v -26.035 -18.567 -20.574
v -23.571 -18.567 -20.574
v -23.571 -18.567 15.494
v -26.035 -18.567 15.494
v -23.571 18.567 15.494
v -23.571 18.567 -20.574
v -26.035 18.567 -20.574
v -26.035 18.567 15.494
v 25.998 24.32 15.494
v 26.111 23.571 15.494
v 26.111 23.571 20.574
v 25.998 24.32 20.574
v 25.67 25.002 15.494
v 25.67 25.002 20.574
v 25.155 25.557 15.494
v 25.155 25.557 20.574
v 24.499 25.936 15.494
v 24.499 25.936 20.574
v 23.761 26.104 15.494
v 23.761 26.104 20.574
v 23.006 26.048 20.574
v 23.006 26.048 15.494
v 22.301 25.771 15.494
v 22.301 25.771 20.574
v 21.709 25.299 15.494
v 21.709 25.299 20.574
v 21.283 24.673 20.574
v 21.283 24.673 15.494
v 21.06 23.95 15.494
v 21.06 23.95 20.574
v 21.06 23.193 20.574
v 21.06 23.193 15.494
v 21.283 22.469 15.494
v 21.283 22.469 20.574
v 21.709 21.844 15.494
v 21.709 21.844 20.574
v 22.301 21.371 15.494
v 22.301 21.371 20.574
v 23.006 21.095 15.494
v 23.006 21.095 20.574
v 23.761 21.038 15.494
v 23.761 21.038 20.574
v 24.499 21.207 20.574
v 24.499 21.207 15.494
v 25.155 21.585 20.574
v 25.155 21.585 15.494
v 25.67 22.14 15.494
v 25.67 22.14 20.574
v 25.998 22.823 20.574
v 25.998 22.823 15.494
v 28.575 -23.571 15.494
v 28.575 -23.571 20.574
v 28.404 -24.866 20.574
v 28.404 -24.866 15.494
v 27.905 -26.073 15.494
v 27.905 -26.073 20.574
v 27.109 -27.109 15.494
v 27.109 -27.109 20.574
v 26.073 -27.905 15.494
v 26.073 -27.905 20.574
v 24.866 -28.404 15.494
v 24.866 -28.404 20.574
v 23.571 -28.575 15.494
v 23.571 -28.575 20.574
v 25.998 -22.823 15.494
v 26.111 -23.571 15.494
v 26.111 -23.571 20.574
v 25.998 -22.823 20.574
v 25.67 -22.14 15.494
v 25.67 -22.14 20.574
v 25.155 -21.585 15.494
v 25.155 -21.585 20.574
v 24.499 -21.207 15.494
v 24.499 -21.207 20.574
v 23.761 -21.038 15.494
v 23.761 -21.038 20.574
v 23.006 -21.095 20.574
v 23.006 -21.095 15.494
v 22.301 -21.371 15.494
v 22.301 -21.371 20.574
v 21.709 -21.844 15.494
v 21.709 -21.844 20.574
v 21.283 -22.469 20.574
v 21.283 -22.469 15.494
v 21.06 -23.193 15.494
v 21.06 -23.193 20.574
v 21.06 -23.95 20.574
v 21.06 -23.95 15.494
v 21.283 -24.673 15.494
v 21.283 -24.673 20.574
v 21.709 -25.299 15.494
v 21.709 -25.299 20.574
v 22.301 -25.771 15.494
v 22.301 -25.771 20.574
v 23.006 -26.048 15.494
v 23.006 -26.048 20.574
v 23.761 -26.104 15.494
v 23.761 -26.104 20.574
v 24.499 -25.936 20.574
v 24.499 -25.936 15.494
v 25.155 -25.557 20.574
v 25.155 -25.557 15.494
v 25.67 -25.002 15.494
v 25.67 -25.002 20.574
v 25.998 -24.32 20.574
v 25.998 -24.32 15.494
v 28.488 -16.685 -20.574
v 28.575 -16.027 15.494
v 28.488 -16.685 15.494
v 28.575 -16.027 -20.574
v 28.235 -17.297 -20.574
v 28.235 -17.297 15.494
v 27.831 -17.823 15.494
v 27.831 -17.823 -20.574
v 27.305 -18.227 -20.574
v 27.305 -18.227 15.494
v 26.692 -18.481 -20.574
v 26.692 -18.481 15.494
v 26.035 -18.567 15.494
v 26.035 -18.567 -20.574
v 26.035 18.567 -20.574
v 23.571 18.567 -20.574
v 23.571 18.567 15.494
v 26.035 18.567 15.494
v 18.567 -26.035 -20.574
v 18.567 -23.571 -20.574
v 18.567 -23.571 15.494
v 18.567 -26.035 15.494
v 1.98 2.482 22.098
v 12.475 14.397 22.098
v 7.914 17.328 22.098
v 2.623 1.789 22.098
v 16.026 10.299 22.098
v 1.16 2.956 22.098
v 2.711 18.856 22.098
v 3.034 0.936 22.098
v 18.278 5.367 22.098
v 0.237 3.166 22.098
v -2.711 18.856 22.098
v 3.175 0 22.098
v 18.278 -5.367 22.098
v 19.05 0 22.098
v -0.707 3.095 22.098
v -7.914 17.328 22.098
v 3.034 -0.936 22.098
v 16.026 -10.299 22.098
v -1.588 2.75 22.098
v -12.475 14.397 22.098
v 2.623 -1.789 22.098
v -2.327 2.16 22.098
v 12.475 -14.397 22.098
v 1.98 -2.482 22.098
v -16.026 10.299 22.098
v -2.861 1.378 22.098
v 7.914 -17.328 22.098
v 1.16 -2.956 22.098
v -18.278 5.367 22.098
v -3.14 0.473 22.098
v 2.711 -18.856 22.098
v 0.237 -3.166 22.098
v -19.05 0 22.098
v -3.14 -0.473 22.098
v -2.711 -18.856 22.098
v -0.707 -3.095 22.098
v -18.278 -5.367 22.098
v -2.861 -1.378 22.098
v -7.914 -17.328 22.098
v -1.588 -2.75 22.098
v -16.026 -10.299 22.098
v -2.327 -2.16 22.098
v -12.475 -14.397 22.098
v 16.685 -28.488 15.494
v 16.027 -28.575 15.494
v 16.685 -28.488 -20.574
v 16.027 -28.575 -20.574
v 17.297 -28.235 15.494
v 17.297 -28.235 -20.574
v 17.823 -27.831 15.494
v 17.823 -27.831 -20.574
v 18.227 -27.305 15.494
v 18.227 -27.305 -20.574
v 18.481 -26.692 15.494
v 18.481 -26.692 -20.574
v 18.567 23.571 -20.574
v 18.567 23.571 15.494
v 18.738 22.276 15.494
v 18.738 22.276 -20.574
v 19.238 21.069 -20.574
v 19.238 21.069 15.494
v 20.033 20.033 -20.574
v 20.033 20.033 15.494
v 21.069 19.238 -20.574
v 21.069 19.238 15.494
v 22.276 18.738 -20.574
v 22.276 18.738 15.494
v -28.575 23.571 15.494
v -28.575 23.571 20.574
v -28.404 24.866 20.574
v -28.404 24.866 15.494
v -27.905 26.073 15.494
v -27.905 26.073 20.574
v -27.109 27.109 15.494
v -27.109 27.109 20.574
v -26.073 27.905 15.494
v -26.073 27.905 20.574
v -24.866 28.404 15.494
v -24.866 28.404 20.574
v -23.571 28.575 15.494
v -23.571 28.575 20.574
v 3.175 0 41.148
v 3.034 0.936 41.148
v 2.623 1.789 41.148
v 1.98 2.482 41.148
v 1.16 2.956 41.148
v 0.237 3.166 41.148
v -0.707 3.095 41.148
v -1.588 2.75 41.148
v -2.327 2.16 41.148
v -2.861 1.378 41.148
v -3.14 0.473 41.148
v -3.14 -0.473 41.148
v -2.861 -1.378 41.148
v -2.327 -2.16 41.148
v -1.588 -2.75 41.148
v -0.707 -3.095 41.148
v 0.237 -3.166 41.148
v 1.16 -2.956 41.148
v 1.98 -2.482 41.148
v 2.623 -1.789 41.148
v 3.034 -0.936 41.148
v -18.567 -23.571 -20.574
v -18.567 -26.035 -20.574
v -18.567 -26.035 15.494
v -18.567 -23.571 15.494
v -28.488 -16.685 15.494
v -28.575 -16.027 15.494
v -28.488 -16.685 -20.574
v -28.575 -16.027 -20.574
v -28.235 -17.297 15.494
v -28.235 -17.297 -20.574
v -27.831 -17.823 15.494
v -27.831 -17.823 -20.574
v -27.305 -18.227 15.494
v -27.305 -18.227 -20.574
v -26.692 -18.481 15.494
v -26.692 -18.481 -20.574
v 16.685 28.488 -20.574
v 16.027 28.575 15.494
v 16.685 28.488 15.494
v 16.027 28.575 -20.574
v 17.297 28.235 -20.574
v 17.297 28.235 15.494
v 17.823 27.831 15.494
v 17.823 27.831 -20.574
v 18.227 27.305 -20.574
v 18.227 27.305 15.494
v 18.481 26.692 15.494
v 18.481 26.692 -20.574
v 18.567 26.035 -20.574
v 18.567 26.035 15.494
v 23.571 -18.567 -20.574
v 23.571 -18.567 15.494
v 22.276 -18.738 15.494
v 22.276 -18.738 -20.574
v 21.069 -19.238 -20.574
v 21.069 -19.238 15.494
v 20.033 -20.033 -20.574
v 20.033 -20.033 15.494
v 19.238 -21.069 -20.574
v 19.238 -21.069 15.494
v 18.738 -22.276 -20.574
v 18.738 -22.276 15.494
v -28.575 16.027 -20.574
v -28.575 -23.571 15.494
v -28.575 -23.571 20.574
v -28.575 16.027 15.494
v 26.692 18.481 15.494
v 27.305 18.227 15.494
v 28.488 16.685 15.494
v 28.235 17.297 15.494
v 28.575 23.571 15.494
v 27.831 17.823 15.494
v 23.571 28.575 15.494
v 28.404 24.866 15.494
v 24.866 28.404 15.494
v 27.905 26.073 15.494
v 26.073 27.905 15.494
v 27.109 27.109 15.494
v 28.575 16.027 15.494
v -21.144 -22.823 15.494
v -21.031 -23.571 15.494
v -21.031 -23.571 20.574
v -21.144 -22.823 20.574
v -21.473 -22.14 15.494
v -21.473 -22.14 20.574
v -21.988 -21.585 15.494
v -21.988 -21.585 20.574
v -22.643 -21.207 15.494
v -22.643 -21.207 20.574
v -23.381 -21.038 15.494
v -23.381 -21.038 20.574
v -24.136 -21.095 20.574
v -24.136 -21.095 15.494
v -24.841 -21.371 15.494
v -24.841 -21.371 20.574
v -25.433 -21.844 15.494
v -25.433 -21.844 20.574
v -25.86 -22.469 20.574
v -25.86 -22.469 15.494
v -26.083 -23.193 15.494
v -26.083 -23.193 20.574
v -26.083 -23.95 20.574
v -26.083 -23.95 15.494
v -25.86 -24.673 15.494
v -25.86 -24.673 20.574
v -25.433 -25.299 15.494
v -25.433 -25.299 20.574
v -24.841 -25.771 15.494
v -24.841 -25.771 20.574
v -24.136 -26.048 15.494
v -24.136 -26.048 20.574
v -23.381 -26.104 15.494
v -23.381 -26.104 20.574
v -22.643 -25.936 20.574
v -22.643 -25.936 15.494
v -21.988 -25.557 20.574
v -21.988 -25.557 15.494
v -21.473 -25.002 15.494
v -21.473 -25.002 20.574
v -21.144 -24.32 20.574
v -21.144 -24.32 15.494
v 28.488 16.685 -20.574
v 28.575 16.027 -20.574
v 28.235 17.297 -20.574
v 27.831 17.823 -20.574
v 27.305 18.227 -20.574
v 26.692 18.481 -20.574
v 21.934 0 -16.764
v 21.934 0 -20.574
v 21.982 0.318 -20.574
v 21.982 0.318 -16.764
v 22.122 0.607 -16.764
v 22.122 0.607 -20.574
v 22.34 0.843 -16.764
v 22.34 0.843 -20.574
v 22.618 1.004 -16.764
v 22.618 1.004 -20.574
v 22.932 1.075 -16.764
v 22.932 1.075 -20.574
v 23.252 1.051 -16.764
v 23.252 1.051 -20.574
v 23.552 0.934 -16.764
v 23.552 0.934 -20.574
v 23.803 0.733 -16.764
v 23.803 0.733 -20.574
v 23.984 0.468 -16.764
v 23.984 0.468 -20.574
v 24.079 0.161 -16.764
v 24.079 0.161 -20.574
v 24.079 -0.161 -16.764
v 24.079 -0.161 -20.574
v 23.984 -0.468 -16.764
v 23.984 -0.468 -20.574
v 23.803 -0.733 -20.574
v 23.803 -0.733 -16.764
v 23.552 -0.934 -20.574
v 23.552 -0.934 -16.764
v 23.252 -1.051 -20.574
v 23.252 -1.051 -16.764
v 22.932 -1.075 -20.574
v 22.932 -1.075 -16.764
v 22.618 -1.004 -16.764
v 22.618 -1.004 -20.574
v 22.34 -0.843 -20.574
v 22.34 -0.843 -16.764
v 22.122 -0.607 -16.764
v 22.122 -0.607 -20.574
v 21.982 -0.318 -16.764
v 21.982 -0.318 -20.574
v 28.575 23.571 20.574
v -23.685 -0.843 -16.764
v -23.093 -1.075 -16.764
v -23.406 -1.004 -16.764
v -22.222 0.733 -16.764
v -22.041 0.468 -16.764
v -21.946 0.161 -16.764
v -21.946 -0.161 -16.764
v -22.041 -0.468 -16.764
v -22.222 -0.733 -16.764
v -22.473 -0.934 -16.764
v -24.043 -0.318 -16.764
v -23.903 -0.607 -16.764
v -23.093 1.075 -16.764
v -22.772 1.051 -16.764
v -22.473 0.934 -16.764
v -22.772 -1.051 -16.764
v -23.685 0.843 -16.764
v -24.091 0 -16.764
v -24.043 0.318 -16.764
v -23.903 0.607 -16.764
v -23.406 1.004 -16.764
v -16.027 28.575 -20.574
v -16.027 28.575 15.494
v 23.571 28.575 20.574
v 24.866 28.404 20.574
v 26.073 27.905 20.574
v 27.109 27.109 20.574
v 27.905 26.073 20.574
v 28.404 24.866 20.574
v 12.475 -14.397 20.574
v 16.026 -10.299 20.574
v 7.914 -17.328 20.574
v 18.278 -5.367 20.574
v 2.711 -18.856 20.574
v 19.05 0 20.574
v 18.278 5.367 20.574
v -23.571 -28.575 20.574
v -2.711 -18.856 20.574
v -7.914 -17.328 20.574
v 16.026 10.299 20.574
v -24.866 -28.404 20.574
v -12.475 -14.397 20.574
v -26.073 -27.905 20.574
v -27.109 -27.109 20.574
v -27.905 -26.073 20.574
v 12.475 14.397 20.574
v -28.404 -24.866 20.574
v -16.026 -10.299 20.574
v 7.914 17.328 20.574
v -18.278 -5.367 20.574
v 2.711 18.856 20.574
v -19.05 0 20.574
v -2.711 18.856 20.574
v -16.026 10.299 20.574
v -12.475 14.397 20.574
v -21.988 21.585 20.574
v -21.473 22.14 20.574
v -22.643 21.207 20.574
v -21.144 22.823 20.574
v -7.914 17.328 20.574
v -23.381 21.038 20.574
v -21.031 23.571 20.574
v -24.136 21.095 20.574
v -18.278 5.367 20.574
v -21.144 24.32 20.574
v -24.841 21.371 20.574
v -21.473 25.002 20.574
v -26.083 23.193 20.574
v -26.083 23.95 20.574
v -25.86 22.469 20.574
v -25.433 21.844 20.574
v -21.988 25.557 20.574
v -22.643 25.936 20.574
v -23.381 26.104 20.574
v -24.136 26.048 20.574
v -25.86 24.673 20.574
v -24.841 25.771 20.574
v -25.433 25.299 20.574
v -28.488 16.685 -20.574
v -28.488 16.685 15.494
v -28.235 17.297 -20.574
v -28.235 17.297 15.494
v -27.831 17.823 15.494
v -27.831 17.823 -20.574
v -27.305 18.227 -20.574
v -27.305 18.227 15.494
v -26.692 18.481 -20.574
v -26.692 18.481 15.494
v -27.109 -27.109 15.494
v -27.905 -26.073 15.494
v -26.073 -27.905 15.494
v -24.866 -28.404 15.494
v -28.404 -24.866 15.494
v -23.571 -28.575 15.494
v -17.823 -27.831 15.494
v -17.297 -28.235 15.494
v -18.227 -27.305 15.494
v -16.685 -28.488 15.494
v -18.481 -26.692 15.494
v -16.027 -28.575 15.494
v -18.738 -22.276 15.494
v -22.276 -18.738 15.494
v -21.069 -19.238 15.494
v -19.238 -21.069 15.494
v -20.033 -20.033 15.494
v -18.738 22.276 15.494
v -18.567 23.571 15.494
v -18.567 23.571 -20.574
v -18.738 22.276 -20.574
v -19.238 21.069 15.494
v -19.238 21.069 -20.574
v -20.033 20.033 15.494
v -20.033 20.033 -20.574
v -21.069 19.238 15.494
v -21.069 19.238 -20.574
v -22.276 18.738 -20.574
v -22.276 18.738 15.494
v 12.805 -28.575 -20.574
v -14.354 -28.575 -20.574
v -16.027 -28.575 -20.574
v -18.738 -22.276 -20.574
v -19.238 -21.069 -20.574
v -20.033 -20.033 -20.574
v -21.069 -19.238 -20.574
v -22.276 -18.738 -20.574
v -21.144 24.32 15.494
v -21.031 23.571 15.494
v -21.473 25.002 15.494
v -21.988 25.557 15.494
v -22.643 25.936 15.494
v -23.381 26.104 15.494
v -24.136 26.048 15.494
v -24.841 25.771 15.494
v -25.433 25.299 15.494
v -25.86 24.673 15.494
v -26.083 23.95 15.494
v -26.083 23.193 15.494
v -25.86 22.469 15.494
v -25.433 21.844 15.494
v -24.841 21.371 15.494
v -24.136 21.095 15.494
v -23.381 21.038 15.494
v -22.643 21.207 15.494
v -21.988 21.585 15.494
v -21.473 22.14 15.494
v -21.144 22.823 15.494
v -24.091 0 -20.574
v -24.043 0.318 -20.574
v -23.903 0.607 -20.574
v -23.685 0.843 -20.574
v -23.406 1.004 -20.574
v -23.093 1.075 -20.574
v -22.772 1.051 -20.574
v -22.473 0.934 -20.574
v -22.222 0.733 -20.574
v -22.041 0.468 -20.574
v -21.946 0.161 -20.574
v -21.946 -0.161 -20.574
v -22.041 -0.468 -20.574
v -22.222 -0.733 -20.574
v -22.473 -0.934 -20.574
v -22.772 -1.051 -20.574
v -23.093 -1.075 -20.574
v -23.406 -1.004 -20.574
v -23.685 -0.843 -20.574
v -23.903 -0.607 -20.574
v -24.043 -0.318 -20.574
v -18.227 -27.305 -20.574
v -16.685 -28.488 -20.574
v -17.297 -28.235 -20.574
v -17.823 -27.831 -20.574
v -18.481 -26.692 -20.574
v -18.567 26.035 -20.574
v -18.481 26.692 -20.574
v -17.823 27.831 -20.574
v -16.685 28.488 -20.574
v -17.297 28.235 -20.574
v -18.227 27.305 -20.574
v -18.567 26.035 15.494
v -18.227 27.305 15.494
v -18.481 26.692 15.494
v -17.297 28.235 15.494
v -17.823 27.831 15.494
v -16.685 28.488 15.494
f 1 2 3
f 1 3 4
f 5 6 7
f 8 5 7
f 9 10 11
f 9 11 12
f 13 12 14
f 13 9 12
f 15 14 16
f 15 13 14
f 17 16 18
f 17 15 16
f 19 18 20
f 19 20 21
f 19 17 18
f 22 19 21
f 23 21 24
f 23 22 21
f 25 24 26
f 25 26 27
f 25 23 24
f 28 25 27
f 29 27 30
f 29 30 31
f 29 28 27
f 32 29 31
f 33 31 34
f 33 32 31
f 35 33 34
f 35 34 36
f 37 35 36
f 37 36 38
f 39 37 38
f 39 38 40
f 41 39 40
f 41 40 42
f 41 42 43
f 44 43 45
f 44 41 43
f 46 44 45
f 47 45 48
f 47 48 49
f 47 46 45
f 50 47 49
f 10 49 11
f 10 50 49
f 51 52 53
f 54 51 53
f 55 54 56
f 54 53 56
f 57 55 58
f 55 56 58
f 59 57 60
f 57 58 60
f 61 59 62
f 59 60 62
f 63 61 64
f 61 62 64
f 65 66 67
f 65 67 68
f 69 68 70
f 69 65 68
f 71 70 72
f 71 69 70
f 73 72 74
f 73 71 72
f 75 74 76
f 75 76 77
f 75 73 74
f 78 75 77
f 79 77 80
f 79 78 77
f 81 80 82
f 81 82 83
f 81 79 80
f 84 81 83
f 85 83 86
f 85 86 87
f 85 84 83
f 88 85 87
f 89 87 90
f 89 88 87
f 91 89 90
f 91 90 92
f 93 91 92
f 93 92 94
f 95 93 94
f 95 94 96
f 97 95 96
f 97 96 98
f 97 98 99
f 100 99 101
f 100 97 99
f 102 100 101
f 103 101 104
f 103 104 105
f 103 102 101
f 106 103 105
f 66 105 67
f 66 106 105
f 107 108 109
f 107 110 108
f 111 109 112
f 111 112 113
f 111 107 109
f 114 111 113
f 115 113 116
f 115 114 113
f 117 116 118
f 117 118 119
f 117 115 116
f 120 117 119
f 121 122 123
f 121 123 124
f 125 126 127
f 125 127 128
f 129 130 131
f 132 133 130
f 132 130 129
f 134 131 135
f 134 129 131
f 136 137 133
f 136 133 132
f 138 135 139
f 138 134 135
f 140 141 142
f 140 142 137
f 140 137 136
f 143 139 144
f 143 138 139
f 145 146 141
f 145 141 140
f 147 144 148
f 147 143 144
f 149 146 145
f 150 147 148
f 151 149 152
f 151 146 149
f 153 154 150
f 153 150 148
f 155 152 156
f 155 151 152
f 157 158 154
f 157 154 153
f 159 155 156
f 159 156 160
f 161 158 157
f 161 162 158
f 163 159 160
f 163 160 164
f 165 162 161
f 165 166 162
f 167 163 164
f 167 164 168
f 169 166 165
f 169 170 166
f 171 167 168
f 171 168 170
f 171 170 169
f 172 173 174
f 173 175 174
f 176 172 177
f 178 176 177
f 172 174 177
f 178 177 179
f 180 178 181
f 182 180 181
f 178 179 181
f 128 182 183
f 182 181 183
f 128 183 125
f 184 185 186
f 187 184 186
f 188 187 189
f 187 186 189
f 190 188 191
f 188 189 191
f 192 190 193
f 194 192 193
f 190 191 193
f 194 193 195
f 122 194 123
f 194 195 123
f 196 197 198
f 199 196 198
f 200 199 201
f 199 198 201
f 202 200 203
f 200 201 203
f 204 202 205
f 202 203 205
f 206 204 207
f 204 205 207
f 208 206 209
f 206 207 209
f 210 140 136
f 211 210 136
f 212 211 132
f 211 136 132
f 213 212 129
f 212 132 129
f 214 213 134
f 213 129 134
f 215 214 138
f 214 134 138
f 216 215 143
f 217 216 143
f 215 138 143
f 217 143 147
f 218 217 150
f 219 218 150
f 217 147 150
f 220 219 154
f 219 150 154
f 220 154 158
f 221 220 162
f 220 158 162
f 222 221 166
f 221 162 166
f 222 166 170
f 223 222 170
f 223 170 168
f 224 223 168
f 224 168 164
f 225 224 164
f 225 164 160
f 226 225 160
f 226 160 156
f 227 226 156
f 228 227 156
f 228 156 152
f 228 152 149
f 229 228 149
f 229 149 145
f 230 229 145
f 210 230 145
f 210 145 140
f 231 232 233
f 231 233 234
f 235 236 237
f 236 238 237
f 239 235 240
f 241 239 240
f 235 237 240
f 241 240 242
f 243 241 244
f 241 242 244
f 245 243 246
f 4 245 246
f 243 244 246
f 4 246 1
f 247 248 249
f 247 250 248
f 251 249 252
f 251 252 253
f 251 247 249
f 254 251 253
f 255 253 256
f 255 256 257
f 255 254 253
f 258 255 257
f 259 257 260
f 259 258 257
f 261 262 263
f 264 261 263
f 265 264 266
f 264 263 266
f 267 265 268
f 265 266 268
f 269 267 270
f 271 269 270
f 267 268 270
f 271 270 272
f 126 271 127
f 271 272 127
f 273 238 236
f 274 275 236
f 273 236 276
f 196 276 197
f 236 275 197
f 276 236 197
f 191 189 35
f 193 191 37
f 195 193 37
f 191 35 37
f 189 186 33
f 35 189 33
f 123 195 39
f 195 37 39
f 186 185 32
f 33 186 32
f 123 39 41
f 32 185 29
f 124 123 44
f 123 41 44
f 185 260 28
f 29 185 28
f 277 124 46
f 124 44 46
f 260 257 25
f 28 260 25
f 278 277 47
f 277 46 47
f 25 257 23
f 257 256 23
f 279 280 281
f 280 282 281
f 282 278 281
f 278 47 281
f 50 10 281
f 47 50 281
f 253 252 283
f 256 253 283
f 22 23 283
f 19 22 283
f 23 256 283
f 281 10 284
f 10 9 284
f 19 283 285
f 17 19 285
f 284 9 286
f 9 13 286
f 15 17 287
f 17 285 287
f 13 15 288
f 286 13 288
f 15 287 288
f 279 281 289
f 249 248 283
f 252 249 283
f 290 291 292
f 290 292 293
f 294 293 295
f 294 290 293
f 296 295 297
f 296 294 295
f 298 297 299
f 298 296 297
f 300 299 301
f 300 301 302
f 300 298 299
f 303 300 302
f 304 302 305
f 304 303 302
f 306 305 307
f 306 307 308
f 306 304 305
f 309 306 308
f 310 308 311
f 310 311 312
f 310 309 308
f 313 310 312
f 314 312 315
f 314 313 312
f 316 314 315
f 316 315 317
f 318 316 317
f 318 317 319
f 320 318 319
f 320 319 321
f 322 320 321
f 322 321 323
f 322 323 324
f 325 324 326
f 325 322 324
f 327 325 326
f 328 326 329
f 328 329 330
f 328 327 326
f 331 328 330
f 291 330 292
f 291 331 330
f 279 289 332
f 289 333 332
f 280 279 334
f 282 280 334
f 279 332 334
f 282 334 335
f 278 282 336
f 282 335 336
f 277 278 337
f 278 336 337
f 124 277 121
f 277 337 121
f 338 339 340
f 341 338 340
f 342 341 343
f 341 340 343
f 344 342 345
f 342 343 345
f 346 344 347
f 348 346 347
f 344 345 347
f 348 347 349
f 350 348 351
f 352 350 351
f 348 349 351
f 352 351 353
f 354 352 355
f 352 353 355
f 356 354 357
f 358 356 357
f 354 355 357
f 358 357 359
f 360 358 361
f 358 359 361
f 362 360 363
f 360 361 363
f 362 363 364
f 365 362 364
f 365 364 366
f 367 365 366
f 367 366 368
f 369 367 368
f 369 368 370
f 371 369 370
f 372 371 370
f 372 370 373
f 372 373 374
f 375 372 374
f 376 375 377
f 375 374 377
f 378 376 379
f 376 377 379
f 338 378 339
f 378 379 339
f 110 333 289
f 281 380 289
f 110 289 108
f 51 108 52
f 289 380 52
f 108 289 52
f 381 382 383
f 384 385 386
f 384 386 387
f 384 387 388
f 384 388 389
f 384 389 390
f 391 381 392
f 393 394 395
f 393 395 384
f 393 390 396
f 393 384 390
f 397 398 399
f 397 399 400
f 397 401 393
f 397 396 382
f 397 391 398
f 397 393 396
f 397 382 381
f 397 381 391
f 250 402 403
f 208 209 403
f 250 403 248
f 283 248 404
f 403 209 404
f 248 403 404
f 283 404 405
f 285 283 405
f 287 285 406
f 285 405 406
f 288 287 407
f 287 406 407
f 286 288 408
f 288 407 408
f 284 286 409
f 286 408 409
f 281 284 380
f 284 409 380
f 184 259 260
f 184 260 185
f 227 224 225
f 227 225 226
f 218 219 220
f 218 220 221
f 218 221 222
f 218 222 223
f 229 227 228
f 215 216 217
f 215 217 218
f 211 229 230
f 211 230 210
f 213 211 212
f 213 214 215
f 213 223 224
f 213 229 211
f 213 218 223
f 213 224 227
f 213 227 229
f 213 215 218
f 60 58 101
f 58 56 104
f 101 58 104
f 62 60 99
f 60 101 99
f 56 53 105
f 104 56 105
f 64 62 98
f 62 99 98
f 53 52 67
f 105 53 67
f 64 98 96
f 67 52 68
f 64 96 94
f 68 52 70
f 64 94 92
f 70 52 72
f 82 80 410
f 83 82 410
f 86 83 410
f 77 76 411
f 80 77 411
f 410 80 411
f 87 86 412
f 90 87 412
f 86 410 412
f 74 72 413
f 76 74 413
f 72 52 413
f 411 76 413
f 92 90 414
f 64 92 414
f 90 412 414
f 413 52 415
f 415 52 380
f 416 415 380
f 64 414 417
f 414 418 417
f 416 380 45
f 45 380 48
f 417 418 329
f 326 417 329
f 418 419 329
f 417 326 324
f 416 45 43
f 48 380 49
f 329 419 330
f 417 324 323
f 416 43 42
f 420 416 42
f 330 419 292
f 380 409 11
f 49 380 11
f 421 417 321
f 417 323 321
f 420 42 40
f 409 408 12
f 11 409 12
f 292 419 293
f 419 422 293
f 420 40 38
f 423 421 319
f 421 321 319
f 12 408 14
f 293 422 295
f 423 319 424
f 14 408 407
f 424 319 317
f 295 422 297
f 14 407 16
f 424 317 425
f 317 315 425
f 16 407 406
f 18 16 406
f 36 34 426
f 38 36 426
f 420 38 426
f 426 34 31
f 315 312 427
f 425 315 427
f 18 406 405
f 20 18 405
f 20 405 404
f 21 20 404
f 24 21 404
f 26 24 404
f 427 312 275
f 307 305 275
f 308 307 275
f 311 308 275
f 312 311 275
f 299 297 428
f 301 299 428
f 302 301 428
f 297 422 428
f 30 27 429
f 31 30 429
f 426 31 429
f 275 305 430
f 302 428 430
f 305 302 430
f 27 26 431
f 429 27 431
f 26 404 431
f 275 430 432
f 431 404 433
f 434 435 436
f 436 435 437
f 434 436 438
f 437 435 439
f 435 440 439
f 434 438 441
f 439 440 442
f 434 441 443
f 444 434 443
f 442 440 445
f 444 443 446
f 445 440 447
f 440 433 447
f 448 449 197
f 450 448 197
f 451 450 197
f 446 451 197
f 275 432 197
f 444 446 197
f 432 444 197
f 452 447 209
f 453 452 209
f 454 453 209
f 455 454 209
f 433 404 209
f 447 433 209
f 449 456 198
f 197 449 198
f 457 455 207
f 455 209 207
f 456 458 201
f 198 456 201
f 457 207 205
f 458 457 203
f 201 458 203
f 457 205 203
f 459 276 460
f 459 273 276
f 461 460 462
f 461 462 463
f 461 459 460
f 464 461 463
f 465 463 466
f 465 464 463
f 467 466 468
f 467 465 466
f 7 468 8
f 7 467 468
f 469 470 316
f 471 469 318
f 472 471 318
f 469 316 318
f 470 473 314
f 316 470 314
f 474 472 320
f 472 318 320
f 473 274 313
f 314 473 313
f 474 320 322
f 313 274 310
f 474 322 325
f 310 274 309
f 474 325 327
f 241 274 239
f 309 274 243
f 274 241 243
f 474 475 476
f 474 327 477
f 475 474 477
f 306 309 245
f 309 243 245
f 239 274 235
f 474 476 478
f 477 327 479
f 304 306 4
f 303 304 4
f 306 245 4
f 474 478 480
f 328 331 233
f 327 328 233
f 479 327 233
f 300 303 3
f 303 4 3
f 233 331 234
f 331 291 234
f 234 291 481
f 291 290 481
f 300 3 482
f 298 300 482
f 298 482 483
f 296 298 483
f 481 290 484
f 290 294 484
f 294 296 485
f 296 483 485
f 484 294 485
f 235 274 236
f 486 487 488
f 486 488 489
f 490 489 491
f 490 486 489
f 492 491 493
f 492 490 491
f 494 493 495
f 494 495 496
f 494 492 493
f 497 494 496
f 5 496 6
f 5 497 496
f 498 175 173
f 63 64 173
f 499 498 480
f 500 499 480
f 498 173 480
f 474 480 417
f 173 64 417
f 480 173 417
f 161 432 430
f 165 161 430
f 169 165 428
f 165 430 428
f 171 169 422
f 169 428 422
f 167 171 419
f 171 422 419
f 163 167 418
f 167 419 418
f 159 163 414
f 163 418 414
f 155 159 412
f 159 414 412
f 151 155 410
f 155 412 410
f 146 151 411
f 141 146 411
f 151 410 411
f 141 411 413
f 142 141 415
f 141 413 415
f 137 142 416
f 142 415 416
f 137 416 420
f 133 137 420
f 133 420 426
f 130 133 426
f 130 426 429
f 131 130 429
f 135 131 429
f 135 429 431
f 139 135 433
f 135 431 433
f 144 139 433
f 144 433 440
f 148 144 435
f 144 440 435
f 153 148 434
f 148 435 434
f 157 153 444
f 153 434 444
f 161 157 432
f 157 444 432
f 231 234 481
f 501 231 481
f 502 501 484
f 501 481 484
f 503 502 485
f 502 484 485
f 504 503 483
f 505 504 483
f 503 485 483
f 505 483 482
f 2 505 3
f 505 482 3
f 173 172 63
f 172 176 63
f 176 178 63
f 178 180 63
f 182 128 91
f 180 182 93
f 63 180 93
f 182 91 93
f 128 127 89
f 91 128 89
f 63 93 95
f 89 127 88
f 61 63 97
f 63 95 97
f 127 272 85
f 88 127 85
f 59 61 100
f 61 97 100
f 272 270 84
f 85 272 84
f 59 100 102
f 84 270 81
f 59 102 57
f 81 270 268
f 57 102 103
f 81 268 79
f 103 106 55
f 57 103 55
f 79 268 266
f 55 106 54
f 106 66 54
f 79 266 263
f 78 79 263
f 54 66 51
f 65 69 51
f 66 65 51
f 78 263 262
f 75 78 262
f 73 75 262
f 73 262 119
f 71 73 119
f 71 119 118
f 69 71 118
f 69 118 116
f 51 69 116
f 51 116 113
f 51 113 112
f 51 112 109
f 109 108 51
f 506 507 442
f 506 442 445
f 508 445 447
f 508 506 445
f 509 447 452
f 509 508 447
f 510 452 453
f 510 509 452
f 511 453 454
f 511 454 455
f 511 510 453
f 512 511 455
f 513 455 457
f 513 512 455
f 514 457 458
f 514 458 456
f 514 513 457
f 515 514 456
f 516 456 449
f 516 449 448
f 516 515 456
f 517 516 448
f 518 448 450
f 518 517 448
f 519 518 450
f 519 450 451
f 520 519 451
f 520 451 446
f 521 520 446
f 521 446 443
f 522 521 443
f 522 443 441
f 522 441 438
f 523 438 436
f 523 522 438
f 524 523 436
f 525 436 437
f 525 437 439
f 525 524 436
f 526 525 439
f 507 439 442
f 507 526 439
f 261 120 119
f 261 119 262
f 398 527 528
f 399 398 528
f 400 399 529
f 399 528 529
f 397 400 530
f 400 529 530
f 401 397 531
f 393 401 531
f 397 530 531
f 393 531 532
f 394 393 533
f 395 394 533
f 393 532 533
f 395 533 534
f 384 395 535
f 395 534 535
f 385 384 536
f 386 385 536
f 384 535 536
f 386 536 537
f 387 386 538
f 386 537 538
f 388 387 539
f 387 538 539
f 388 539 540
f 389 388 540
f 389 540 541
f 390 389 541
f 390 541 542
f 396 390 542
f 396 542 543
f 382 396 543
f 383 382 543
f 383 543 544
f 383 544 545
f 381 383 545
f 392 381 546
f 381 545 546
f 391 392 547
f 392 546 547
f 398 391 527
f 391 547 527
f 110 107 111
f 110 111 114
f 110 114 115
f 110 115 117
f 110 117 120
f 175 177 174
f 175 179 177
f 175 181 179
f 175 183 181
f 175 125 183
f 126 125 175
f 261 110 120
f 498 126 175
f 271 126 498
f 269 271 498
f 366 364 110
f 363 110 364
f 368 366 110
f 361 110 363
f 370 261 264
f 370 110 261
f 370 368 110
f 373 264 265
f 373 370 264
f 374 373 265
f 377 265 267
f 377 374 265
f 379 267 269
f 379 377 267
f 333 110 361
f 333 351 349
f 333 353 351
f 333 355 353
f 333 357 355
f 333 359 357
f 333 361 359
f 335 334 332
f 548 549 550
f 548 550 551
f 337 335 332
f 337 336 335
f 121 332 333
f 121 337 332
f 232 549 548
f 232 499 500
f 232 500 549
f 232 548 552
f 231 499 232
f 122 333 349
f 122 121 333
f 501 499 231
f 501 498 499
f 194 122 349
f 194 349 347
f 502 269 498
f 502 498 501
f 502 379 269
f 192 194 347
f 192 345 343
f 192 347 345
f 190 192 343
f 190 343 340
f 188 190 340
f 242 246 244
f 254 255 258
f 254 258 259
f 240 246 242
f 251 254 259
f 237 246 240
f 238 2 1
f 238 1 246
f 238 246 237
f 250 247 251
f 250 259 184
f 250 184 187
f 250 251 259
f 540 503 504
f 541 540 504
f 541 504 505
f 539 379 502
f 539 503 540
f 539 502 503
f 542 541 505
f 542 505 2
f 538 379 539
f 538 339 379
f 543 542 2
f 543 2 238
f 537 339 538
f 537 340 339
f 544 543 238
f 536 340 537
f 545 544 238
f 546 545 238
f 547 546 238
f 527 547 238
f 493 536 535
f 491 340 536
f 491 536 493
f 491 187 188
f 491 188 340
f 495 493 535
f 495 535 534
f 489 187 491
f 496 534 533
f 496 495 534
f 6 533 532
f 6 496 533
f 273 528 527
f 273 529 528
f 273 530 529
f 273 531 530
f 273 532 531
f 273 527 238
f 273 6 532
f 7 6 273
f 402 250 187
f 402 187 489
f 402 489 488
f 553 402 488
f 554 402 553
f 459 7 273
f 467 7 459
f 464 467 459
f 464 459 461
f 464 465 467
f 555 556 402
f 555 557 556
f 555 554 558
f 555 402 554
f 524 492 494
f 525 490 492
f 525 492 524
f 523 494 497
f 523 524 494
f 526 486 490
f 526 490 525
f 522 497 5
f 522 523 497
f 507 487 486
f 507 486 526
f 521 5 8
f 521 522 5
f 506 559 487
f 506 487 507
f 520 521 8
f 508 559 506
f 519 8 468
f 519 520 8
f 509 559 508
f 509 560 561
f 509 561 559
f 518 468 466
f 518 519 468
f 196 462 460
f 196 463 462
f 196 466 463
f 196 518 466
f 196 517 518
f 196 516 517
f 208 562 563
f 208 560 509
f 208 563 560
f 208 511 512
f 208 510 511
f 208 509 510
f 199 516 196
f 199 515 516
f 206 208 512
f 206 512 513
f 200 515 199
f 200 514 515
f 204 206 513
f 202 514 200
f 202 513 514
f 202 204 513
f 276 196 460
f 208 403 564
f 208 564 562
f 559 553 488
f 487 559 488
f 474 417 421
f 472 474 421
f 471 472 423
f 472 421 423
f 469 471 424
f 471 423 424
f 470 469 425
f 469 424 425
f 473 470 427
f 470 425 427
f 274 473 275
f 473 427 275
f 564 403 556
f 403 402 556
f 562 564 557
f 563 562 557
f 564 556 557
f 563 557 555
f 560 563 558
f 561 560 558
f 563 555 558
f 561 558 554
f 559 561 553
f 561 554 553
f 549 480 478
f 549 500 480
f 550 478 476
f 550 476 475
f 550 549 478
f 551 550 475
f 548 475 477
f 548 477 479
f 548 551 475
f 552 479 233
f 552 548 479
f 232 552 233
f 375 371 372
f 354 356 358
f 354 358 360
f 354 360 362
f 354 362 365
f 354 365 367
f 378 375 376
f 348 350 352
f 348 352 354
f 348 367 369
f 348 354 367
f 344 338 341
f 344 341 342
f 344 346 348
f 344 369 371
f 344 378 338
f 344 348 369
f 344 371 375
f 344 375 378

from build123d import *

# Parameters (mm, degrees)
SKETCH1_R          = 2.54
EXTRUDE1_DEPTH     = 20.574
SKETCH2_R          = 19.05
EXTRUDE2_DEPTH     = 1.524
SKETCH3_R          = 3.175
EXTRUDE3_DEPTH     = 20.574
EXTRUDE4_START     = -36.068
EXTRUDE4_DEPTH     = 36.068
FILLET1_R          = 2.54
EXTRUDE5_START     = 14.986
SKETCH5_R          = 3.175
EXTRUDE5_DEPTH     = 14.986
SKETCH6_R          = 1.07823
EXTRUDE6_DEPTH     = 3.81
SKETCH9_W          = 27.159483829
SKETCH9_H          = 18.094101739
CUT_EXTRUDE1_DEPTH = 56.642


with BuildPart() as part:
    # Sketch1 → Extrude1 (new, symmetric)
    with BuildSketch(Plane.XY):
        with BuildLine():
            Line((-23.5712, 28.575), (23.5712, 28.575))
            ThreePointArc((23.5712, 28.575), (27.109420912, 27.109420912), (28.575, 23.5712))
            Line((28.575, 23.5712), (28.575, -23.5712))
            ThreePointArc((28.575, -23.5712), (27.109420912, -27.109420912), (23.5712, -28.575))
            Line((23.5712, -28.575), (-23.5712, -28.575))
            ThreePointArc((-23.5712, -28.575), (-27.109420912, -27.109420912), (-28.575, -23.5712))
            Line((-28.575, -23.5712), (-28.575, 23.5712))
            ThreePointArc((-28.575, 23.5712), (-27.109420912, 27.109420912), (-23.5712, 28.575))
        make_face()
        with Locations((-23.5712, 23.5712)):
            Circle(SKETCH1_R, mode=Mode.SUBTRACT)
        with Locations((23.5712, 23.5712)):
            Circle(SKETCH1_R, mode=Mode.SUBTRACT)
        with Locations((23.5712, -23.5712)):
            Circle(SKETCH1_R, mode=Mode.SUBTRACT)
        with Locations((-23.5712, -23.5712)):
            Circle(SKETCH1_R, mode=Mode.SUBTRACT)
    extrude(amount=EXTRUDE1_DEPTH, both=True)

    # Sketch2 → Extrude2 (add)
    with BuildSketch(Plane.XY.offset(20.574)):
        with Locations(Location((0, 0, 0), (0, 0, 180))):
            Circle(SKETCH2_R)
    extrude(amount=EXTRUDE2_DEPTH)

    # Sketch3 → Extrude3 (add)
    with BuildSketch(Plane.XY.offset(20.574)):
        Circle(SKETCH3_R)
    extrude(amount=EXTRUDE3_DEPTH)

    # Sketch4 → Extrude4 (cut)
    with BuildSketch(Plane(origin=(0, 0, -20.574), x_dir=(-1, 0, 0), z_dir=(0, 0, -1)).offset(EXTRUDE4_START)):
        with BuildLine():
            Line((-23.5712, 18.5674), (-28.575, 18.5674))
            Line((-28.575, 18.5674), (-28.575, 23.5712))
            ThreePointArc((-28.575, 23.5712), (-27.109420912, 27.109420912), (-23.5712, 28.575))
            Line((-23.5712, 28.575), (-18.5674, 28.575))
            Line((-18.5674, 28.575), (-18.5674, 23.5712))
            ThreePointArc((-18.5674, 23.5712), (-20.032979088, 20.032979088), (-23.5712, 18.5674))
        make_face()
        with BuildLine():
            Line((23.5712, 18.5674), (28.575, 18.5674))
            Line((28.575, 18.5674), (28.575, 23.5712))
            ThreePointArc((28.575, 23.5712), (27.109420912, 27.109420912), (23.5712, 28.575))
            Line((23.5712, 28.575), (18.5674, 28.575))
            Line((18.5674, 28.575), (18.5674, 23.5712))
            ThreePointArc((18.5674, 23.5712), (20.032979088, 20.032979088), (23.5712, 18.5674))
        make_face()
        with BuildLine():
            Line((23.5712, -18.5674), (28.575, -18.5674))
            Line((28.575, -18.5674), (28.575, -23.5712))
            ThreePointArc((28.575, -23.5712), (27.109420912, -27.109420912), (23.5712, -28.575))
            Line((23.5712, -28.575), (18.5674, -28.575))
            Line((18.5674, -28.575), (18.5674, -23.5712))
            ThreePointArc((18.5674, -23.5712), (20.032979088, -20.032979088), (23.5712, -18.5674))
        make_face()
        with BuildLine():
            Line((-18.5674, -23.5712), (-18.5674, -28.575))
            Line((-18.5674, -28.575), (-23.5712, -28.575))
            ThreePointArc((-23.5712, -28.575), (-27.109420912, -27.109420912), (-28.575, -23.5712))
            Line((-28.575, -23.5712), (-28.575, -18.5674))
            Line((-28.575, -18.5674), (-23.5712, -18.5674))
            ThreePointArc((-23.5712, -18.5674), (-20.032979088, -20.032979088), (-18.5674, -23.5712))
        make_face()
    extrude(amount=EXTRUDE4_DEPTH, mode=Mode.SUBTRACT)

    # Fillet1
    fillet1_edges = [part.edges().sort_by_distance(p)[0] for p in [
        (28.575, -18.5674, -2.54),
        (18.5674, -28.575, -2.54),
        (18.5674, 28.575, -2.54),
        (28.575, 18.5674, -2.54),
        (-28.575, 18.5674, -2.54),
        (-18.5674, 28.575, -2.54),
        (-18.5674, -28.575, -2.54),
        (-28.575, -18.5674, -2.54),
    ]]
    fillet(fillet1_edges, radius=FILLET1_R)

    # Sketch5 → Extrude5 (add)
    with BuildSketch(Plane(origin=(0, 0, -20.574), x_dir=(-1, 0, 0), z_dir=(0, 0, -1)).offset(EXTRUDE5_START)):
        with Locations(Location((0, 0, 0), (0, 0, 180))):
            Circle(SKETCH5_R)
    extrude(amount=-EXTRUDE5_DEPTH)

    # Sketch6 → Extrude6 (cut)
    with BuildSketch(Plane(origin=(0, 0, -20.574), x_dir=(-1, 0, 0), z_dir=(0, 0, -1))):
        with Locations((-23.0124, 0)):
            Circle(SKETCH6_R)
        with Locations((23.0124, 0)):
            Circle(SKETCH6_R)
    extrude(amount=-EXTRUDE6_DEPTH, mode=Mode.SUBTRACT)

    # Sketch9 → Cut-Extrude1 (cut)
    with BuildSketch(Plane.XZ.offset(28.575)):
        with Locations((-0.774509995, -29.62105087)):
            Rectangle(SKETCH9_W, SKETCH9_H)
    extrude(amount=-CUT_EXTRUDE1_DEPTH, mode=Mode.SUBTRACT)


solid = part.part
